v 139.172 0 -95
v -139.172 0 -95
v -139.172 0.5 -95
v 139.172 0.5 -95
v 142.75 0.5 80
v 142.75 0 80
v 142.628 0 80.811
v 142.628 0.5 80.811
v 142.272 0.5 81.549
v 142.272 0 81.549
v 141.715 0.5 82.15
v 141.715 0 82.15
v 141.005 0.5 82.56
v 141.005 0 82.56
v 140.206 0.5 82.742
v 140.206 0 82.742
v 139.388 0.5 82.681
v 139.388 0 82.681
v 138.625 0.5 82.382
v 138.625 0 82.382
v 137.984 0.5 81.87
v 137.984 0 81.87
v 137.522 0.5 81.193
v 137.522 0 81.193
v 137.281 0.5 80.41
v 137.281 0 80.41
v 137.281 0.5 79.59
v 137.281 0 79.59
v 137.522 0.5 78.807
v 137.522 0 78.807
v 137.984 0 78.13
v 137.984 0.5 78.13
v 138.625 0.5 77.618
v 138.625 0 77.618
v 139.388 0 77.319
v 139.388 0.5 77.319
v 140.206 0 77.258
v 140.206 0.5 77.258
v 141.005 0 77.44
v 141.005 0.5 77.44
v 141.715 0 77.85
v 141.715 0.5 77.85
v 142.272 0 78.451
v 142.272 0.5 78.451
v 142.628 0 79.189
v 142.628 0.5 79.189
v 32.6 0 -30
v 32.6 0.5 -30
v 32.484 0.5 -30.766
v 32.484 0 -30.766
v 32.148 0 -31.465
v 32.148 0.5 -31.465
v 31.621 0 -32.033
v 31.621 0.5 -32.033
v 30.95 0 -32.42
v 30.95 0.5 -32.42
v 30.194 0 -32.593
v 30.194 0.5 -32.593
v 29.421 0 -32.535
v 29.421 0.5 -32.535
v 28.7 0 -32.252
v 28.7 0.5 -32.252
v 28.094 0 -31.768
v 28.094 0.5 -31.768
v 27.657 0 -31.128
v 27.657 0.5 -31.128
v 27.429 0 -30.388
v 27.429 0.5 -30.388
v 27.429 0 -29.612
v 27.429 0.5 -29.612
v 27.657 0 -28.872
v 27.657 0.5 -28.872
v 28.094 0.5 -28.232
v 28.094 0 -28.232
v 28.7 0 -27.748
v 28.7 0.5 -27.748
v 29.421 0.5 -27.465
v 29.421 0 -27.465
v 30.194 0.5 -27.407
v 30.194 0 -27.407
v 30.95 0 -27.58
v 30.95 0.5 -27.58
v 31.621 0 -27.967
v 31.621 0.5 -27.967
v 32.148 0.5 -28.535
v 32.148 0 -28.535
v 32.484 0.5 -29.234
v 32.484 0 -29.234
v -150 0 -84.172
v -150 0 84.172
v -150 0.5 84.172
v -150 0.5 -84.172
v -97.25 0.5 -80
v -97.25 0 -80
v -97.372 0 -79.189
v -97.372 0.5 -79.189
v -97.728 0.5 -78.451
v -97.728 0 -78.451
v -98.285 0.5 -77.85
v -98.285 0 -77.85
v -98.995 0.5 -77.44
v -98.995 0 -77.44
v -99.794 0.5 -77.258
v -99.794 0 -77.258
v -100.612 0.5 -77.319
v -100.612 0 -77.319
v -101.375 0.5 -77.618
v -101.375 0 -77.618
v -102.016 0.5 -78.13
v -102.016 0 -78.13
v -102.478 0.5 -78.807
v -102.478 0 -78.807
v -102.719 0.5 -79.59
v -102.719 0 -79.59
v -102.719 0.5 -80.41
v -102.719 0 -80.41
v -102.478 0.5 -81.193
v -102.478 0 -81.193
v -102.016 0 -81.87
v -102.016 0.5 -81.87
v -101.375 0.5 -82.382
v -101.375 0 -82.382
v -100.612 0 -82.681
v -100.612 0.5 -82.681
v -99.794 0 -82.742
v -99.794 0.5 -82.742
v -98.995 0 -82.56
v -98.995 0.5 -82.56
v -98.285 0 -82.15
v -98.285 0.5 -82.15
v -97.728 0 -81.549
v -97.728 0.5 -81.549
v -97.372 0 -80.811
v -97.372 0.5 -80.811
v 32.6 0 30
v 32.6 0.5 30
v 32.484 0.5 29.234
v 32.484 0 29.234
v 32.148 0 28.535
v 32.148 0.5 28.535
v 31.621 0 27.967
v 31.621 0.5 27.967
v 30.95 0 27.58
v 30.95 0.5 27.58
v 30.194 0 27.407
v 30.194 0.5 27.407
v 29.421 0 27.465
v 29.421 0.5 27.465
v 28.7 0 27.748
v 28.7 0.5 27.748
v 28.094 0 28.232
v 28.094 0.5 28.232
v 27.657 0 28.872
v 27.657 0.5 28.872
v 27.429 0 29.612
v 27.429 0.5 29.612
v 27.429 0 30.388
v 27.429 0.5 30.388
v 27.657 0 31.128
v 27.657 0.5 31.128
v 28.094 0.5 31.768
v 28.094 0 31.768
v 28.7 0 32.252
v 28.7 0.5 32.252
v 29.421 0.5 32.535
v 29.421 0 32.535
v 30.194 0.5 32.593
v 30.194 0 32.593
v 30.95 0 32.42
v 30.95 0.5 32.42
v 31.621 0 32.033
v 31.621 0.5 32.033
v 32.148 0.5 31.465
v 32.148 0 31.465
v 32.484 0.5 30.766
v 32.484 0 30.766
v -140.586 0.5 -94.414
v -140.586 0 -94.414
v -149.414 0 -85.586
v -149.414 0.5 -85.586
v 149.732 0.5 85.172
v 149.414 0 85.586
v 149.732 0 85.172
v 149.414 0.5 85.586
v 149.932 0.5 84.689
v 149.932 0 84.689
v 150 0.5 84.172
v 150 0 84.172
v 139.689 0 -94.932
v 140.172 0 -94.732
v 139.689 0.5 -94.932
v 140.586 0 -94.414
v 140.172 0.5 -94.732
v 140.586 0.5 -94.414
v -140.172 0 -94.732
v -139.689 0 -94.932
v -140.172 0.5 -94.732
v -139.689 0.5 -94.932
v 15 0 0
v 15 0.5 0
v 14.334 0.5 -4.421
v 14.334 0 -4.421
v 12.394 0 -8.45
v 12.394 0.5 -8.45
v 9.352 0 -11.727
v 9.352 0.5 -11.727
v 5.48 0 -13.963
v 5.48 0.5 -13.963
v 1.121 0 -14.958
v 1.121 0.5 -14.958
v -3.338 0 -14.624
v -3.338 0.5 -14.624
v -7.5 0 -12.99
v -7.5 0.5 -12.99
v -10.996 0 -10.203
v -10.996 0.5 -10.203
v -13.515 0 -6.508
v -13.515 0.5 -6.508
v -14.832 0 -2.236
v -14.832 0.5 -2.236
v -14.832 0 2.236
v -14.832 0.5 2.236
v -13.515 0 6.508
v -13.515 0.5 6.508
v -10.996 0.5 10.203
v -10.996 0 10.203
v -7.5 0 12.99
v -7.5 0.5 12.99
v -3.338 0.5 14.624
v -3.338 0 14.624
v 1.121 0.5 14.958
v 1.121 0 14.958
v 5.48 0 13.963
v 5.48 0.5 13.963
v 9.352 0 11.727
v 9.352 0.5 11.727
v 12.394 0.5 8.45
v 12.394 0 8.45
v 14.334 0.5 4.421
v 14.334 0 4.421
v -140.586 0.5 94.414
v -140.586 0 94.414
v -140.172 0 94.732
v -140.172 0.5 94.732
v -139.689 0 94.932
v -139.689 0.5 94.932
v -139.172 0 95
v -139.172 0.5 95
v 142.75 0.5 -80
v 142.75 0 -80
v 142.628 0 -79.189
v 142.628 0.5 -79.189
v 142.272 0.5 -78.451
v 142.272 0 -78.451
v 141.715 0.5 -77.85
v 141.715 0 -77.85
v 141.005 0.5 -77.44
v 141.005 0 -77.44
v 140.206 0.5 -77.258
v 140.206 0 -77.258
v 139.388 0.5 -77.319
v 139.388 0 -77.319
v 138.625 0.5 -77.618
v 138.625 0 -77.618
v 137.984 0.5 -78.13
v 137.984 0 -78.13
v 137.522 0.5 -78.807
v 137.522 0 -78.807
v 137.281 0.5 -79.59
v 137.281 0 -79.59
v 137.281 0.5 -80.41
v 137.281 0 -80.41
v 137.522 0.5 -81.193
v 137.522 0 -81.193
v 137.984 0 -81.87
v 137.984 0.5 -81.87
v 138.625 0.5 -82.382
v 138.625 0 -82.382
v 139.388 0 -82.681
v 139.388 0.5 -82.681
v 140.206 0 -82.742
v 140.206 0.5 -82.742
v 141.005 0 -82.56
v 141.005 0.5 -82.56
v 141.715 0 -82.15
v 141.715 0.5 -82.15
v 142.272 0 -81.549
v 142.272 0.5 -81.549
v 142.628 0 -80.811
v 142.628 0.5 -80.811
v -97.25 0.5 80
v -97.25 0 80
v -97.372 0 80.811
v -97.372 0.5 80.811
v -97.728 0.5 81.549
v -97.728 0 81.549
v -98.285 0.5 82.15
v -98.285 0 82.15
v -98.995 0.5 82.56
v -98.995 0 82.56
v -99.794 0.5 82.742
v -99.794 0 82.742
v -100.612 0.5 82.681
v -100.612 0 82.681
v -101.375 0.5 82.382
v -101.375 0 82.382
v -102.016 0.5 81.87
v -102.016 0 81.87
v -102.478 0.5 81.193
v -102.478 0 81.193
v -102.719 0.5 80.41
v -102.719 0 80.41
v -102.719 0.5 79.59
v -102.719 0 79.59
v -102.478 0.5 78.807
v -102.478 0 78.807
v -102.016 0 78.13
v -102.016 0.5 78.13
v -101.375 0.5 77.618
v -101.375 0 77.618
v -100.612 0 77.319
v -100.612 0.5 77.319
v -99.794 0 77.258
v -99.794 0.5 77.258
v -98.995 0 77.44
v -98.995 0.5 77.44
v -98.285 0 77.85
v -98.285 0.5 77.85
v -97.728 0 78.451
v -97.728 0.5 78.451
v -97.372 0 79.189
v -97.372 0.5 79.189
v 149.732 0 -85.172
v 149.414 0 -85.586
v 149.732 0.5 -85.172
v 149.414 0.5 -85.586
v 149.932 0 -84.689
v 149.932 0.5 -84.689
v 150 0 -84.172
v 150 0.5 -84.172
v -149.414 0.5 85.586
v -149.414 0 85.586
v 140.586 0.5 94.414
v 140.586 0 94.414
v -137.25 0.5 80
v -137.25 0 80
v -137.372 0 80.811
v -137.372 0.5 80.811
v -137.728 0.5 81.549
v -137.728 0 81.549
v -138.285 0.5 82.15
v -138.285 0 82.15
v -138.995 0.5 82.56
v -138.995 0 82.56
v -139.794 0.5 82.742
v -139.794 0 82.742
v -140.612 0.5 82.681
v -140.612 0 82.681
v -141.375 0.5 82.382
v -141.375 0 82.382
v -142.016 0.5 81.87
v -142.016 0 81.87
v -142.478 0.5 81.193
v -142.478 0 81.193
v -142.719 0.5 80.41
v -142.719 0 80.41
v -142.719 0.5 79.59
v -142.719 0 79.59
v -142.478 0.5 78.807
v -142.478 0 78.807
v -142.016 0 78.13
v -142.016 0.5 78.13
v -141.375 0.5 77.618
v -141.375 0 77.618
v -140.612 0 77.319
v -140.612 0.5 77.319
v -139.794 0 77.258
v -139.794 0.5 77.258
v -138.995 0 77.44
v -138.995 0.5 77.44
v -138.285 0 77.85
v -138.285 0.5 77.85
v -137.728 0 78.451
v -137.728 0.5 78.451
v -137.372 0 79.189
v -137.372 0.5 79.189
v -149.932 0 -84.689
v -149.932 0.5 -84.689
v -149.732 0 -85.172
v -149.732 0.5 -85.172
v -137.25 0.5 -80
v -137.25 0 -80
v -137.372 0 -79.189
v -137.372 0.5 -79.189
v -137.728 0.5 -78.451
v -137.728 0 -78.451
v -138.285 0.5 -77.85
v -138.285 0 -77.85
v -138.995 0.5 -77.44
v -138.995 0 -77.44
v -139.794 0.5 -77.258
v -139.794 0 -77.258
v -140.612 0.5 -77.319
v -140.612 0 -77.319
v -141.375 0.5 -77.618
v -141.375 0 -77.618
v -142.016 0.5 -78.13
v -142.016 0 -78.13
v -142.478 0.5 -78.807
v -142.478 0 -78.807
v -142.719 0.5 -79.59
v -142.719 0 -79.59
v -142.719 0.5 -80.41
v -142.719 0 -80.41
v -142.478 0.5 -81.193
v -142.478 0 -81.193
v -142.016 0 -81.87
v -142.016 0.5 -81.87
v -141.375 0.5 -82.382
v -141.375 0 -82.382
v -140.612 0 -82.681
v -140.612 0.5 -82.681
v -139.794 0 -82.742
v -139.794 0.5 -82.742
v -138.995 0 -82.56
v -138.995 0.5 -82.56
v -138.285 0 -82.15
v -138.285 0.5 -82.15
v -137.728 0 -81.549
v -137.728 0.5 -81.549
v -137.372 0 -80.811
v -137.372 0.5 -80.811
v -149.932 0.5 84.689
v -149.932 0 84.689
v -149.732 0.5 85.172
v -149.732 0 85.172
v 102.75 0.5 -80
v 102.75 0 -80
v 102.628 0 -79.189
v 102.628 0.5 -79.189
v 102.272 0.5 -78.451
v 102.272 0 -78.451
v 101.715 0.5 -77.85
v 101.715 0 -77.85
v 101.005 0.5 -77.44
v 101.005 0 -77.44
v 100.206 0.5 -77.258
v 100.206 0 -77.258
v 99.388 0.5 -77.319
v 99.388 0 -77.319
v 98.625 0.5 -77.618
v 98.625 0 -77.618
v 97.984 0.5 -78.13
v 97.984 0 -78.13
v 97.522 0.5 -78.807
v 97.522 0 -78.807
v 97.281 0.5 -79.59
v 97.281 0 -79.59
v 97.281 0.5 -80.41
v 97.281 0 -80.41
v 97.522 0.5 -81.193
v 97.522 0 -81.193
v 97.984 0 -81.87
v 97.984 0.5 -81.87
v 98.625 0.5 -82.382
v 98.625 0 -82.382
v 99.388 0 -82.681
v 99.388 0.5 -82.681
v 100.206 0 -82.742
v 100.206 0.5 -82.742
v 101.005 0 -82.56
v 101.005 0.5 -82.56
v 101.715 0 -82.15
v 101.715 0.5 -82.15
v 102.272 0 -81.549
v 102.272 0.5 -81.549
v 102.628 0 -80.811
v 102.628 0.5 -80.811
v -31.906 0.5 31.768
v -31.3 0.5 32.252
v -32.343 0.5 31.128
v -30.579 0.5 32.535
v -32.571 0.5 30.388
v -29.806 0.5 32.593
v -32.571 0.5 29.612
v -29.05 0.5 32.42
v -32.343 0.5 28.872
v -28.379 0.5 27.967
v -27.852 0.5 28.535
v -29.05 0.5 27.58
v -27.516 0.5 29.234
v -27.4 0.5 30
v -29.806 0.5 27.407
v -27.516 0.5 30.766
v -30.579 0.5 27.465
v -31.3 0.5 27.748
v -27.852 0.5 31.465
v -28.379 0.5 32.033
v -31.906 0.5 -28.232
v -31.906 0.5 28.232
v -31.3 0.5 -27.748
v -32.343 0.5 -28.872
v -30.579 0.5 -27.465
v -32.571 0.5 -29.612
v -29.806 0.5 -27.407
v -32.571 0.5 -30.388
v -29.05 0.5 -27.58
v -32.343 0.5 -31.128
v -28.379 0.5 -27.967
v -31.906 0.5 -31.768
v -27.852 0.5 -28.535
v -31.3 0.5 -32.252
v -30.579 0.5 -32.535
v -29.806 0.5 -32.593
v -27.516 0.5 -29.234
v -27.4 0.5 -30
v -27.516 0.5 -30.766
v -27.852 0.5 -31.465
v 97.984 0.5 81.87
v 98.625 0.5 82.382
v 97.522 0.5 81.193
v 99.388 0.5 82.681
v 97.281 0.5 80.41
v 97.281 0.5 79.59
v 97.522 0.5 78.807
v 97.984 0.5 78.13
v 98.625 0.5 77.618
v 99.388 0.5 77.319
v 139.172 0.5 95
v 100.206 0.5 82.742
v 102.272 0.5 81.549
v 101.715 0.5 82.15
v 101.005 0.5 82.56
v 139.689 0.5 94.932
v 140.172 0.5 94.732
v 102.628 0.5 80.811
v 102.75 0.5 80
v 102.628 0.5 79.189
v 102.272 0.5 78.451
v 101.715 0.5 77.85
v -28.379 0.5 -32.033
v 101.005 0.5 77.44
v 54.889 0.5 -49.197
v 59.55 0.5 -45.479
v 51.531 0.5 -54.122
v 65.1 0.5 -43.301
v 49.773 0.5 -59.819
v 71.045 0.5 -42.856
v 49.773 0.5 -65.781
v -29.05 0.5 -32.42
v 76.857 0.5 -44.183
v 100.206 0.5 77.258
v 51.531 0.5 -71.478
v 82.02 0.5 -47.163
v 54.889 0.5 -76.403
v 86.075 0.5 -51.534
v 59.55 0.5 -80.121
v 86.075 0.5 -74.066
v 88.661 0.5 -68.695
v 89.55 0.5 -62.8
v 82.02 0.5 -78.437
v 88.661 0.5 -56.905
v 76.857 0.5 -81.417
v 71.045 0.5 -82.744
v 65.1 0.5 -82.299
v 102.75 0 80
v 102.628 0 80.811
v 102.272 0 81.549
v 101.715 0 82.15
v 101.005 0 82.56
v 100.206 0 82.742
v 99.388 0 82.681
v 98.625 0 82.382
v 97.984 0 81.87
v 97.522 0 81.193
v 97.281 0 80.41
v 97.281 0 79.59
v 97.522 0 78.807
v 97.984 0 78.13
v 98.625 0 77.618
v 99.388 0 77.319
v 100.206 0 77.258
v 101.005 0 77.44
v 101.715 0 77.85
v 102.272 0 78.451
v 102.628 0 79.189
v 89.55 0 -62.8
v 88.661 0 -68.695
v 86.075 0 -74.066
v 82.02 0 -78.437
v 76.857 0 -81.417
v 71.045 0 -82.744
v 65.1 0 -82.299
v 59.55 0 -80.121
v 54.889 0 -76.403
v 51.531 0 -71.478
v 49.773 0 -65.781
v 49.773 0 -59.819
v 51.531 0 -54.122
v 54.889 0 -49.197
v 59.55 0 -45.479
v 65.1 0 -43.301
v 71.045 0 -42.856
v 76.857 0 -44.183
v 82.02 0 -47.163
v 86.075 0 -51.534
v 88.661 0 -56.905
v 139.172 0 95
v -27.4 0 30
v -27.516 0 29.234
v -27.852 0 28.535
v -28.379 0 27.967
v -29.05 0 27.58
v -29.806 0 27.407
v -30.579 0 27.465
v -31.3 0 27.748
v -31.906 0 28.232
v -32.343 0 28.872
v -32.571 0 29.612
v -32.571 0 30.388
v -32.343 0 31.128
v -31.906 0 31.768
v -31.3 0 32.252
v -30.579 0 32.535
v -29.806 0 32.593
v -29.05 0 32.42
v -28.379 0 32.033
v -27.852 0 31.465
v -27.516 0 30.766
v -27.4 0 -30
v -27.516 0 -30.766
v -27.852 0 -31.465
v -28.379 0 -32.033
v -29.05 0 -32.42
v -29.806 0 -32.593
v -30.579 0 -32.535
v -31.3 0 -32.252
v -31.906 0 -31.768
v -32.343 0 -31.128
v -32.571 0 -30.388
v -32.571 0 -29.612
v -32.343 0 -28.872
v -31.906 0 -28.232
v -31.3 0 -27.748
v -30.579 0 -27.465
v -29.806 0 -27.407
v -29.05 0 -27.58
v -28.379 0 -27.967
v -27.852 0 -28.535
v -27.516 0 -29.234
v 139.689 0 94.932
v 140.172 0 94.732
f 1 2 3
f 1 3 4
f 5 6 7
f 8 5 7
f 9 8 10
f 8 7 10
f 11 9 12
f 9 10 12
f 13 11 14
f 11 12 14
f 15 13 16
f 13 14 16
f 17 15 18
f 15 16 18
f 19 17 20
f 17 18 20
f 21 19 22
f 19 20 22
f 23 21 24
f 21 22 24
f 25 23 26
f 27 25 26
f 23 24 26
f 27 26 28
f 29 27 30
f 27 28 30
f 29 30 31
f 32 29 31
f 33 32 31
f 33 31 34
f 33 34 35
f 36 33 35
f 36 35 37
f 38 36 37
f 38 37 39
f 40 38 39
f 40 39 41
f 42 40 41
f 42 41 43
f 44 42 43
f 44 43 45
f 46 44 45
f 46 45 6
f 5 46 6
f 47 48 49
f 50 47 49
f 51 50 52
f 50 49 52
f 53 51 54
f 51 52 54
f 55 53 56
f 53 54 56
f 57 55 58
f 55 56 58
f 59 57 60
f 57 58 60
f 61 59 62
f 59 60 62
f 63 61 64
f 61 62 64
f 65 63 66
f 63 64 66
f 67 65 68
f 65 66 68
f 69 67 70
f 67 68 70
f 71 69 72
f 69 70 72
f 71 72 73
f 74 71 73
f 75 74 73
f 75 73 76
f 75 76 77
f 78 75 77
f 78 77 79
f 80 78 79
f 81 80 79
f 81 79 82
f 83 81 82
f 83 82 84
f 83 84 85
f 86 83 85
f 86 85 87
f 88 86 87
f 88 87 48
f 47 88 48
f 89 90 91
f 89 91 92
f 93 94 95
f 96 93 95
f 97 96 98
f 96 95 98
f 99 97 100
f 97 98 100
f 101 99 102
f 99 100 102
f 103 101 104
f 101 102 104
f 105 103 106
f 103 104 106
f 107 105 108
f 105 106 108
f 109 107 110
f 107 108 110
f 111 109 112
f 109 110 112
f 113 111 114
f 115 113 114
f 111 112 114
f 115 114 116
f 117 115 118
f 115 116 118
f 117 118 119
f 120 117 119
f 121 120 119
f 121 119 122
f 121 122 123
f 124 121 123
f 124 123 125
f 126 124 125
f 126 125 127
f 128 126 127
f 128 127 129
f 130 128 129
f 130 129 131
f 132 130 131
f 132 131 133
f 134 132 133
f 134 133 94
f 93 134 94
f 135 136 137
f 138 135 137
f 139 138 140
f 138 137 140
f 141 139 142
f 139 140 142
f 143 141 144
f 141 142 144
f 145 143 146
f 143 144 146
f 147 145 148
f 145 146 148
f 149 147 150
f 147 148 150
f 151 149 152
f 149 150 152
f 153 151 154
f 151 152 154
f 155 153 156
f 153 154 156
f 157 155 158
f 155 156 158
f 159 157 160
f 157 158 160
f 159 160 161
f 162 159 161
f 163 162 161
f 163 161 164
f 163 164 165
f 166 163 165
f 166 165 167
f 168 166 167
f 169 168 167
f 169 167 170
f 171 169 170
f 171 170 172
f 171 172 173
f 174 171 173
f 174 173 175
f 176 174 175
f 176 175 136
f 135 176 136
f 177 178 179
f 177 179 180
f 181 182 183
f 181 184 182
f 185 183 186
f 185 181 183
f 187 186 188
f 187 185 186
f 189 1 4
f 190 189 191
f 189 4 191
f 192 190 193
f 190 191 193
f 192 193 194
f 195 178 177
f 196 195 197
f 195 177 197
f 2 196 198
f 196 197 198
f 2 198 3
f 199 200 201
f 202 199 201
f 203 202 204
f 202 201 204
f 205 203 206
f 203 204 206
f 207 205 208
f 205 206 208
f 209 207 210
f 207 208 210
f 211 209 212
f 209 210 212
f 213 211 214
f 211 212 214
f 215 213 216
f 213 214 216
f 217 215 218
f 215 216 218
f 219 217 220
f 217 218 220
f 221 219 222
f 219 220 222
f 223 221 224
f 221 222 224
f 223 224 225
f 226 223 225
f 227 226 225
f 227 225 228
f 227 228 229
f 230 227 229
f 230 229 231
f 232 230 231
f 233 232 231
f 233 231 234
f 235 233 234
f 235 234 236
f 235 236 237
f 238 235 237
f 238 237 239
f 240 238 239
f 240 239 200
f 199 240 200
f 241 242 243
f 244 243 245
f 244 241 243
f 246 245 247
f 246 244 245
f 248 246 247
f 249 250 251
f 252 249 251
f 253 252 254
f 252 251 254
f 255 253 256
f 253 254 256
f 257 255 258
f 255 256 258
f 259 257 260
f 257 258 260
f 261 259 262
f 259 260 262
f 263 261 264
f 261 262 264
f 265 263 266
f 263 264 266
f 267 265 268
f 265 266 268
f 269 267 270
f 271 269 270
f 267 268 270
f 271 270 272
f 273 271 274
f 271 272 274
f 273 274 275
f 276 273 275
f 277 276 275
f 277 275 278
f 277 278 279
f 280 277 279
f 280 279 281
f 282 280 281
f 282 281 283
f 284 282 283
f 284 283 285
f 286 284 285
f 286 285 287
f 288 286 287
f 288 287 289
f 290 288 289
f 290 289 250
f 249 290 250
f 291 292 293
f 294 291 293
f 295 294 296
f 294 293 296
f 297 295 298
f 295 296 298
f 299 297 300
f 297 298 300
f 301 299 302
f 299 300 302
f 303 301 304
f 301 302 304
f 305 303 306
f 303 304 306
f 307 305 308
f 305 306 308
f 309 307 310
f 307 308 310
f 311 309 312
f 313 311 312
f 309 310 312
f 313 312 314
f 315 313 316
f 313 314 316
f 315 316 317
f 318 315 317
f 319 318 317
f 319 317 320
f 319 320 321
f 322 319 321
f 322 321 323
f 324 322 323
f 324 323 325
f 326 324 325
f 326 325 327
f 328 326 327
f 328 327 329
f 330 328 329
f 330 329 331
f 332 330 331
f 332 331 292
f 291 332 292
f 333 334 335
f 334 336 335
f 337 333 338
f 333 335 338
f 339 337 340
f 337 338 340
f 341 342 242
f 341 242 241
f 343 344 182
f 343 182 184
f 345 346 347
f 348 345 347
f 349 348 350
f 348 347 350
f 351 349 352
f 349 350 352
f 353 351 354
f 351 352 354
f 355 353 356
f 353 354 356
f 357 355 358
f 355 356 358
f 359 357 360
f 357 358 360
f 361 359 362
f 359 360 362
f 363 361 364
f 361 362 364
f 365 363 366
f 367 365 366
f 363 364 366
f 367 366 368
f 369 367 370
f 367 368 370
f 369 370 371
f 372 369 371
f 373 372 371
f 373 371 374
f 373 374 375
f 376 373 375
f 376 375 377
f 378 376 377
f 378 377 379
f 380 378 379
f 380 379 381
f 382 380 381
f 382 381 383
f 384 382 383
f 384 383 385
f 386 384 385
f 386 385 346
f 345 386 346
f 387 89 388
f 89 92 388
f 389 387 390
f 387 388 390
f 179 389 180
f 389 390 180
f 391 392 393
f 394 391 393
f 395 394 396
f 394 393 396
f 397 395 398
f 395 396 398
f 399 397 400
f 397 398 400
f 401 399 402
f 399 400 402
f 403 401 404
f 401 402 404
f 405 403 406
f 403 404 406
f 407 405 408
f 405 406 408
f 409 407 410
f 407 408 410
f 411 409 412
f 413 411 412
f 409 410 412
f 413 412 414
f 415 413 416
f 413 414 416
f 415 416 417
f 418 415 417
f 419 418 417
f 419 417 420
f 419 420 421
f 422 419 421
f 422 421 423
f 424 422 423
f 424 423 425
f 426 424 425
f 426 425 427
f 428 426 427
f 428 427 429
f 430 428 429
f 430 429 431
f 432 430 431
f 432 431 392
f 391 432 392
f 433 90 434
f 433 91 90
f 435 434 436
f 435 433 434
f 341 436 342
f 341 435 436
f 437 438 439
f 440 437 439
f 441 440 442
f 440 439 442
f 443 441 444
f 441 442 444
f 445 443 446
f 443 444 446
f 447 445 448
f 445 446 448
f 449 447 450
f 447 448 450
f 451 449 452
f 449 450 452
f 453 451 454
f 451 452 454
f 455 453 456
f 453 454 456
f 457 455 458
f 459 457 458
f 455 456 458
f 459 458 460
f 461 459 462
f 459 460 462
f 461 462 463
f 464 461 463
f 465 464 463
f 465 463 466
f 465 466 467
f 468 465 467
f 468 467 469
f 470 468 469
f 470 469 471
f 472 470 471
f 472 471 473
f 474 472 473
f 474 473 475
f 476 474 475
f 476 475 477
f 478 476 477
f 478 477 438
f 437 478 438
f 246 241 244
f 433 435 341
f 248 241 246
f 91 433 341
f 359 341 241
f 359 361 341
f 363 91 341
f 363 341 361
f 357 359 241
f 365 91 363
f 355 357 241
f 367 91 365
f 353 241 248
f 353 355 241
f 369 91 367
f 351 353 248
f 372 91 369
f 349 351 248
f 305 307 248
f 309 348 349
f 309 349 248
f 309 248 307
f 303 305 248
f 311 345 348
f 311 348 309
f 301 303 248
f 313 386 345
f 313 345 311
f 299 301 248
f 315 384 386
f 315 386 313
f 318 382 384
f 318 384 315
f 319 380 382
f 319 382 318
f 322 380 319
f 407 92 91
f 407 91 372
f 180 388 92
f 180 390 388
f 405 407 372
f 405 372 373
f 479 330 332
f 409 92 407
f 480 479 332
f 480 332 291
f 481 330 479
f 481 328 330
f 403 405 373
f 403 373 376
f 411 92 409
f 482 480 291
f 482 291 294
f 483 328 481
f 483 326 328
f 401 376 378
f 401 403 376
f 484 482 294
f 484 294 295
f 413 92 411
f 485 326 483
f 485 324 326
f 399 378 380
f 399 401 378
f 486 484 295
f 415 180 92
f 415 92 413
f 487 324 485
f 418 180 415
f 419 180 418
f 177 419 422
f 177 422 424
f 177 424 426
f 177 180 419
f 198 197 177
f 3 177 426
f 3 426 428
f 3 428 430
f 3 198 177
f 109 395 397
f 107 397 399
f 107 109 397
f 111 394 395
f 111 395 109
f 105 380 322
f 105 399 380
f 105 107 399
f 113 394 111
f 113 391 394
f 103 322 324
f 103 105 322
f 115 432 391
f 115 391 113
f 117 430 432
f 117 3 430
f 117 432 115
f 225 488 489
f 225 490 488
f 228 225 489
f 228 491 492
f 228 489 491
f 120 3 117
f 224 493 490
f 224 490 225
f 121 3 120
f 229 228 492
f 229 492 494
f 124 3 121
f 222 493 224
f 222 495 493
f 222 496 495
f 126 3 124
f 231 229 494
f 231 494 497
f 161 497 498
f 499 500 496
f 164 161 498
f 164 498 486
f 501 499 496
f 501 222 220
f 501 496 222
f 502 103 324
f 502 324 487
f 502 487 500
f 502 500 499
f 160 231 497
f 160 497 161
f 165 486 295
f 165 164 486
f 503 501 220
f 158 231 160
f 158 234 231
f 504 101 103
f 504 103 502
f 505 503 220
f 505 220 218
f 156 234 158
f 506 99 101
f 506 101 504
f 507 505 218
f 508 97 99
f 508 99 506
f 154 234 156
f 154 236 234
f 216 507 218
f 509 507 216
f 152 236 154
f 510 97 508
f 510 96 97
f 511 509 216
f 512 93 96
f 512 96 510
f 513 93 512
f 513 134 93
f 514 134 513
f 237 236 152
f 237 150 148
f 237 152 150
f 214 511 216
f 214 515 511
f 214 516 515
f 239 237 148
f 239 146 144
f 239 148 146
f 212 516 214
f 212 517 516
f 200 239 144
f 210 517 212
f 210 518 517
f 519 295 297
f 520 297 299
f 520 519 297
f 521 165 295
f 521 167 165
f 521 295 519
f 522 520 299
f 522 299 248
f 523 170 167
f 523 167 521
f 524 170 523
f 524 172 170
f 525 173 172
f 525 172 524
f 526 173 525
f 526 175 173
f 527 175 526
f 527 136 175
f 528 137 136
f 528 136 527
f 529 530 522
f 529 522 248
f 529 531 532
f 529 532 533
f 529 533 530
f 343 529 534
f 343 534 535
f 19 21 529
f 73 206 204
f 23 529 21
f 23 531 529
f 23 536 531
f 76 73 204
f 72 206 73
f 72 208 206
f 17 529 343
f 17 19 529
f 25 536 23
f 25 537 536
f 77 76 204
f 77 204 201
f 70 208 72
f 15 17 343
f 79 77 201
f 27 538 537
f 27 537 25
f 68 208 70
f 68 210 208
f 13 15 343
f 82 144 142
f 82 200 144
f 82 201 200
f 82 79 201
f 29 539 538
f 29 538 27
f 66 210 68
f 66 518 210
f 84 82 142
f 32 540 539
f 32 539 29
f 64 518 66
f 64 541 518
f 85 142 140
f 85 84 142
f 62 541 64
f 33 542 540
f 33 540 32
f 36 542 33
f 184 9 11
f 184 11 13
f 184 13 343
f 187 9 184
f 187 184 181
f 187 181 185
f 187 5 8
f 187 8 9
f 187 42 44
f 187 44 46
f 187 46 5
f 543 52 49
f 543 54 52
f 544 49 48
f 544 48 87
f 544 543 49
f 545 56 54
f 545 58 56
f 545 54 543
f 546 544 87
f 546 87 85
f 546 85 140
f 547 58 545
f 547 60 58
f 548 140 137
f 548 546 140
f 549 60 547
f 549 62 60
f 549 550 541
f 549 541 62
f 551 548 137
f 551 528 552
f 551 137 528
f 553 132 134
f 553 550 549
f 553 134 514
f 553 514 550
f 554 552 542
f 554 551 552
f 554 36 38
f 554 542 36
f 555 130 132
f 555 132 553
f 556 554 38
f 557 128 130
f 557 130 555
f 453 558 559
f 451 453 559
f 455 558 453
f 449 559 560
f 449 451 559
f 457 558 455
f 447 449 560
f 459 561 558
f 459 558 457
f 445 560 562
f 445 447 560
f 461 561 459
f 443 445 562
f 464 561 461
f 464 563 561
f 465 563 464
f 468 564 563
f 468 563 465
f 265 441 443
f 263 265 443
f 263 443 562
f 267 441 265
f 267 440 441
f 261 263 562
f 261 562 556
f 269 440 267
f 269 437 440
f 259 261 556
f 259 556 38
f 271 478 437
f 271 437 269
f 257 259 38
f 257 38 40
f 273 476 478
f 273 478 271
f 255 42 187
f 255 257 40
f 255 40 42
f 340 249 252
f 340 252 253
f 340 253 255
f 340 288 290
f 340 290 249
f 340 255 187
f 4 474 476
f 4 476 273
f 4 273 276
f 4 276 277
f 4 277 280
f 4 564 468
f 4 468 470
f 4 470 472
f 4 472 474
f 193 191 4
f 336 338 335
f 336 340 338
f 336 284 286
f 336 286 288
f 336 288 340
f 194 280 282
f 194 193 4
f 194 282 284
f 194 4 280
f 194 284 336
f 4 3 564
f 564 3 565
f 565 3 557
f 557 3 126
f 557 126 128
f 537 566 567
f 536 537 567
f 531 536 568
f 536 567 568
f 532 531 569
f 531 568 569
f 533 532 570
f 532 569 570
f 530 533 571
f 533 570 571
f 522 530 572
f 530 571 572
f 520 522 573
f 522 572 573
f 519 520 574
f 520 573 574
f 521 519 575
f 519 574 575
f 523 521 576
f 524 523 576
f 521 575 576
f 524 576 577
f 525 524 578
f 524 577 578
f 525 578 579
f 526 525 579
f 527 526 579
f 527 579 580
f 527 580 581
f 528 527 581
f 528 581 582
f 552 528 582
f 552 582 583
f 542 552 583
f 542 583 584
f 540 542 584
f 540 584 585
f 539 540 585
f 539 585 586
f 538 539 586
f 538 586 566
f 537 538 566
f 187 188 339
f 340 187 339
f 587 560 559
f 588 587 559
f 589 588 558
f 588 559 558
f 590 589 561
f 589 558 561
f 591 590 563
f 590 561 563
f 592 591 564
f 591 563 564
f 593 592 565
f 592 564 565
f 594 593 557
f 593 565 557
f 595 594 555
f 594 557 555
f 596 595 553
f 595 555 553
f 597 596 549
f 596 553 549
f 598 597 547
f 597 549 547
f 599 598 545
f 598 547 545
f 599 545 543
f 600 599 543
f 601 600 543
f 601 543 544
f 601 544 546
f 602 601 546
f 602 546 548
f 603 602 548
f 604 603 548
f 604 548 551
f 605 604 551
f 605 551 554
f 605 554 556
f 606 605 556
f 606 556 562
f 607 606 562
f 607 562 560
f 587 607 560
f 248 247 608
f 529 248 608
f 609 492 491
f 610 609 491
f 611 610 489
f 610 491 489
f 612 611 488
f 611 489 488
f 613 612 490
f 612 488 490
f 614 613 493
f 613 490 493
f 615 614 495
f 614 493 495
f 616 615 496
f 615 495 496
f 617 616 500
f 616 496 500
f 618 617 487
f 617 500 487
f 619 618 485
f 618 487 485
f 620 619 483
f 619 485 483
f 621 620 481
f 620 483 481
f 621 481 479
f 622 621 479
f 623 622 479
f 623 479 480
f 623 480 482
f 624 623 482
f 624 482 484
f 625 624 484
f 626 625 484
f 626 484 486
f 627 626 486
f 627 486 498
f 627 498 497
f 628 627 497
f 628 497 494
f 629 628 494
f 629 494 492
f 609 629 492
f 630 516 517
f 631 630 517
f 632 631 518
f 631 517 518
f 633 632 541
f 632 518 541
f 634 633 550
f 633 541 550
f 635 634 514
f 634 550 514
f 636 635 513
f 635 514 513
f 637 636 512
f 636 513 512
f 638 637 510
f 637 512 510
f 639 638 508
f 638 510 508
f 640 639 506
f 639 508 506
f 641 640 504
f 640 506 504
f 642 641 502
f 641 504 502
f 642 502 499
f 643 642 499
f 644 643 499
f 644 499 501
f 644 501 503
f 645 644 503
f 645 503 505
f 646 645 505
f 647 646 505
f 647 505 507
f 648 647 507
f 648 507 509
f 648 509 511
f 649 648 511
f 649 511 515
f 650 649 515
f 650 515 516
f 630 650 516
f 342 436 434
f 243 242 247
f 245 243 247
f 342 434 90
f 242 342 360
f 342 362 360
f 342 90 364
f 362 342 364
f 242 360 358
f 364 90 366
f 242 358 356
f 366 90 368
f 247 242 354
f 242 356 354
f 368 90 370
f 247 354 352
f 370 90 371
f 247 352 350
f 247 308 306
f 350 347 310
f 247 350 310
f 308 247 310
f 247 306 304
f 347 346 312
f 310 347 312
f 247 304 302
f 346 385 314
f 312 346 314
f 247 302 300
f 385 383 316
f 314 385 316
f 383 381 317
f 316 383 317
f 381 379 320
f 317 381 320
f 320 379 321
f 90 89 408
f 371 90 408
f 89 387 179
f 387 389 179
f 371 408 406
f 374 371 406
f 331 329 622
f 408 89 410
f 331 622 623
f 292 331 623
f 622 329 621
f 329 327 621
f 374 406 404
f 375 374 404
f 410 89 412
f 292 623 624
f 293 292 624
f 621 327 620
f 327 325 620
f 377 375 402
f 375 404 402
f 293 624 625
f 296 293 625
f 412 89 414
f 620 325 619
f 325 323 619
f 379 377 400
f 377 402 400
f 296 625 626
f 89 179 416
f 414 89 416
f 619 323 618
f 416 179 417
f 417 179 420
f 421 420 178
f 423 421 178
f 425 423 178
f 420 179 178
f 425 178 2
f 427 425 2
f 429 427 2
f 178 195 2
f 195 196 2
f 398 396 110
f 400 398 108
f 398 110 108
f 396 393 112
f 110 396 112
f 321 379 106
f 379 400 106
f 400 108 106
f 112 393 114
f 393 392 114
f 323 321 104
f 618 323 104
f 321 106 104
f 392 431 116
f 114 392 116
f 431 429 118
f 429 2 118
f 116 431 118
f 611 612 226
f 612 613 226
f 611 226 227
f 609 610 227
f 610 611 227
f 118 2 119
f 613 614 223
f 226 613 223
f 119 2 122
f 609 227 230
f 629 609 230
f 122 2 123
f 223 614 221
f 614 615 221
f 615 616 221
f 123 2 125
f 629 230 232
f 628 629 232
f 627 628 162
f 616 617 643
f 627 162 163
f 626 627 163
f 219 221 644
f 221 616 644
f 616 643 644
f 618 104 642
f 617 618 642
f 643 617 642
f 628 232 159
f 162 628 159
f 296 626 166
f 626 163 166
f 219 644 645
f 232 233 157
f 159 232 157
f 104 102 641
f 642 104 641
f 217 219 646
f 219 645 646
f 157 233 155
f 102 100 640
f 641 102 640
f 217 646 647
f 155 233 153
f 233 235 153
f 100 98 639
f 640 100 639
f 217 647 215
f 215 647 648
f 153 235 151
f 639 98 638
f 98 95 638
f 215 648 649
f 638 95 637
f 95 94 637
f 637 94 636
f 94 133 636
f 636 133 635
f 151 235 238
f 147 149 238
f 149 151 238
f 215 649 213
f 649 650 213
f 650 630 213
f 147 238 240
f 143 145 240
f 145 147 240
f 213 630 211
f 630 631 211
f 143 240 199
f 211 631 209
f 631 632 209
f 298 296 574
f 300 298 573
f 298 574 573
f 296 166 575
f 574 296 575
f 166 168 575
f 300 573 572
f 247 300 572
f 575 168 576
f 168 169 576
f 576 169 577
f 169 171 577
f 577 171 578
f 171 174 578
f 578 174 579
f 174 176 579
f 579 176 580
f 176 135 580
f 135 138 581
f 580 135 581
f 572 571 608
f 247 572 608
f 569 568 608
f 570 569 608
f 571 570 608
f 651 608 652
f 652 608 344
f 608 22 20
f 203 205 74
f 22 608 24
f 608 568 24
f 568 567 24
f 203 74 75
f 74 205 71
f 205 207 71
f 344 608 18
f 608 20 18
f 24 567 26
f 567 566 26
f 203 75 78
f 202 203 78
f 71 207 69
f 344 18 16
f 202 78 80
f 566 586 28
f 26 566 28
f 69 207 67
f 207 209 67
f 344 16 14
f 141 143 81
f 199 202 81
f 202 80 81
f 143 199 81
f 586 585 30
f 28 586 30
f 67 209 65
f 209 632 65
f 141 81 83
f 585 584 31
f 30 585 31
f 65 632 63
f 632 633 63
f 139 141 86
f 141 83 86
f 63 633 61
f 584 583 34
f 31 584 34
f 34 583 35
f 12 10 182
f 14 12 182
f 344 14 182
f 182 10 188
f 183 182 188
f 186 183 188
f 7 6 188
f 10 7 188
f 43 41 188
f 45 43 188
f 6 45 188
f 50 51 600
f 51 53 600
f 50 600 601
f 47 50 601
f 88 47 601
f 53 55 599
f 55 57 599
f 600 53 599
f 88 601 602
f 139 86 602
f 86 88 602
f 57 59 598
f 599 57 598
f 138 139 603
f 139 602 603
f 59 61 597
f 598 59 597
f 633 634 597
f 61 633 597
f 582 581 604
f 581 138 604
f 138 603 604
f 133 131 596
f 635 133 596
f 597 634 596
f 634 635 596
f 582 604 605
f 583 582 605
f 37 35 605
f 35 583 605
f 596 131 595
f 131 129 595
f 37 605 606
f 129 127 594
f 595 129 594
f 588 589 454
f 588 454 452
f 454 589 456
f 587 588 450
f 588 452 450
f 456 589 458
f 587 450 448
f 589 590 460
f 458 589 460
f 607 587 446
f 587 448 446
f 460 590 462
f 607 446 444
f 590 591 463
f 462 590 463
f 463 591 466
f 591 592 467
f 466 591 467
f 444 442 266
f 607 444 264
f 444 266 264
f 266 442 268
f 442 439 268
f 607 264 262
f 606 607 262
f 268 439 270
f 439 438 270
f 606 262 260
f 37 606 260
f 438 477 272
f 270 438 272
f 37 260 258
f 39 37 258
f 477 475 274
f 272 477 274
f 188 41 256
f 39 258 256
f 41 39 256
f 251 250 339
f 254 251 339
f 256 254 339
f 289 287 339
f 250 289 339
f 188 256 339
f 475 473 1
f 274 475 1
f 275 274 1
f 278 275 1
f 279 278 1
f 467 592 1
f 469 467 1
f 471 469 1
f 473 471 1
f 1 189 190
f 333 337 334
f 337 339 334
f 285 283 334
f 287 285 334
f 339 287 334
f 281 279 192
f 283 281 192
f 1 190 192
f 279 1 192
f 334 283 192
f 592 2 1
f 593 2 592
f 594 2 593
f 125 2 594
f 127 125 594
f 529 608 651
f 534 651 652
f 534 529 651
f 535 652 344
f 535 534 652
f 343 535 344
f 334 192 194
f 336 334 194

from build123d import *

# Parameters (mm, degrees)
ESQUISSE1_W                     = 300
ESQUISSE1_H                     = 190
BOSS_EXTRU_1_DEPTH              = 0.5
CHANFREIN1_SIZE                 = 10
CONG_1_R                        = 2
ESQUISSE2_R                     = 2.75
ENL_V_MAT_EXTRU_1_DEPTH         = 1.5
R_P_TITION_LIN_AIRE1_COUNT      = 2
R_P_TITION_LIN_AIRE1_PITCH      = 240
R_P_TITION_LIN_AIRE1_COUNT_DIR2 = 2
R_P_TITION_LIN_AIRE1_PITCH_DIR2 = 160
ESQUISSE4_R                     = 2.75
ESQUISSE4_R_2                   = 20
ESQUISSE4_R_3                   = 15
ENL_V_MAT_EXTRU_3_DEPTH         = 10
ESQUISSE5_R                     = 2.6
ENL_V_MAT_EXTRU_4_DEPTH         = 1.5


with BuildPart() as part:
    # Esquisse1 → Boss.-Extru.1 (new body)
    with BuildSketch(Plane(origin=(0, 0, 0), x_dir=(1, 0, 0), z_dir=(0, 1, 0))):
        Rectangle(ESQUISSE1_W, ESQUISSE1_H)
    extrude(amount=BOSS_EXTRU_1_DEPTH)

    # Chanfrein1
    chanfrein1_edges = [part.edges().sort_by_distance(p)[0] for p in [
        (150, 0.25, 95),
        (-150, 0.25, 95),
        (-150, 0.25, -95),
        (150, 0.25, -95),
    ]]
    chamfer(chanfrein1_edges, length=CHANFREIN1_SIZE)

    # Congé1
    cong_1_edges = [part.edges().sort_by_distance(p)[0] for p in [
        (140, 0.25, 95),
        (-140, 0.25, 95),
        (-150, 0.25, -85),
        (-150, 0.25, 85),
        (150, 0.25, -85),
        (150, 0.25, 85),
        (-140, 0.25, -95),
        (140, 0.25, -95),
    ]]
    fillet(cong_1_edges, radius=CONG_1_R)

    # Esquisse2 → Enlèv. mat.-Extru.1 (cut, through all)
    with BuildSketch(Plane.XZ):
        with Locations((-140, 80)):
            Circle(ESQUISSE2_R)
        with Locations((-100, 80)):
            Circle(ESQUISSE2_R)
    enl_v_mat_extru_1 = extrude(amount=-ENL_V_MAT_EXTRU_1_DEPTH, mode=Mode.SUBTRACT)

    # Répétition linéaire1: Enl_v. mat.-Extru.1 2 × 2
    with Locations(*[(i * R_P_TITION_LIN_AIRE1_PITCH, 0, -j * R_P_TITION_LIN_AIRE1_PITCH_DIR2) for i in range(R_P_TITION_LIN_AIRE1_COUNT) for j in range(R_P_TITION_LIN_AIRE1_COUNT_DIR2) if (i, j) != (0, 0)]):
        add(enl_v_mat_extru_1, mode=Mode.SUBTRACT)

    # Esquisse4 → Enlèv. mat.-Extru.3 (cut)
    with BuildSketch(Plane(origin=(0, 0.5, 0), x_dir=(1, 0, 0), z_dir=(0, 1, 0))):
        with Locations((100, 80)):
            Circle(ESQUISSE4_R)
        with Locations((69.55, 62.8)):
            Circle(ESQUISSE4_R_2)
        Circle(ESQUISSE4_R_3)
    extrude(amount=-ENL_V_MAT_EXTRU_3_DEPTH, mode=Mode.SUBTRACT)

    # Esquisse5 → Enlèv. mat.-Extru.4 (cut, through all)
    with BuildSketch(Plane(origin=(0, 0.5, 0), x_dir=(1, 0, 0), z_dir=(0, 1, 0))):
        with Locations((-30, 30)):
            Circle(ESQUISSE5_R)
        with Locations((30, 30)):
            Circle(ESQUISSE5_R)
        with Locations((30, -30)):
            Circle(ESQUISSE5_R)
        with Locations((-30, -30)):
            Circle(ESQUISSE5_R)
    extrude(amount=-ENL_V_MAT_EXTRU_4_DEPTH, mode=Mode.SUBTRACT)


solid = part.part
